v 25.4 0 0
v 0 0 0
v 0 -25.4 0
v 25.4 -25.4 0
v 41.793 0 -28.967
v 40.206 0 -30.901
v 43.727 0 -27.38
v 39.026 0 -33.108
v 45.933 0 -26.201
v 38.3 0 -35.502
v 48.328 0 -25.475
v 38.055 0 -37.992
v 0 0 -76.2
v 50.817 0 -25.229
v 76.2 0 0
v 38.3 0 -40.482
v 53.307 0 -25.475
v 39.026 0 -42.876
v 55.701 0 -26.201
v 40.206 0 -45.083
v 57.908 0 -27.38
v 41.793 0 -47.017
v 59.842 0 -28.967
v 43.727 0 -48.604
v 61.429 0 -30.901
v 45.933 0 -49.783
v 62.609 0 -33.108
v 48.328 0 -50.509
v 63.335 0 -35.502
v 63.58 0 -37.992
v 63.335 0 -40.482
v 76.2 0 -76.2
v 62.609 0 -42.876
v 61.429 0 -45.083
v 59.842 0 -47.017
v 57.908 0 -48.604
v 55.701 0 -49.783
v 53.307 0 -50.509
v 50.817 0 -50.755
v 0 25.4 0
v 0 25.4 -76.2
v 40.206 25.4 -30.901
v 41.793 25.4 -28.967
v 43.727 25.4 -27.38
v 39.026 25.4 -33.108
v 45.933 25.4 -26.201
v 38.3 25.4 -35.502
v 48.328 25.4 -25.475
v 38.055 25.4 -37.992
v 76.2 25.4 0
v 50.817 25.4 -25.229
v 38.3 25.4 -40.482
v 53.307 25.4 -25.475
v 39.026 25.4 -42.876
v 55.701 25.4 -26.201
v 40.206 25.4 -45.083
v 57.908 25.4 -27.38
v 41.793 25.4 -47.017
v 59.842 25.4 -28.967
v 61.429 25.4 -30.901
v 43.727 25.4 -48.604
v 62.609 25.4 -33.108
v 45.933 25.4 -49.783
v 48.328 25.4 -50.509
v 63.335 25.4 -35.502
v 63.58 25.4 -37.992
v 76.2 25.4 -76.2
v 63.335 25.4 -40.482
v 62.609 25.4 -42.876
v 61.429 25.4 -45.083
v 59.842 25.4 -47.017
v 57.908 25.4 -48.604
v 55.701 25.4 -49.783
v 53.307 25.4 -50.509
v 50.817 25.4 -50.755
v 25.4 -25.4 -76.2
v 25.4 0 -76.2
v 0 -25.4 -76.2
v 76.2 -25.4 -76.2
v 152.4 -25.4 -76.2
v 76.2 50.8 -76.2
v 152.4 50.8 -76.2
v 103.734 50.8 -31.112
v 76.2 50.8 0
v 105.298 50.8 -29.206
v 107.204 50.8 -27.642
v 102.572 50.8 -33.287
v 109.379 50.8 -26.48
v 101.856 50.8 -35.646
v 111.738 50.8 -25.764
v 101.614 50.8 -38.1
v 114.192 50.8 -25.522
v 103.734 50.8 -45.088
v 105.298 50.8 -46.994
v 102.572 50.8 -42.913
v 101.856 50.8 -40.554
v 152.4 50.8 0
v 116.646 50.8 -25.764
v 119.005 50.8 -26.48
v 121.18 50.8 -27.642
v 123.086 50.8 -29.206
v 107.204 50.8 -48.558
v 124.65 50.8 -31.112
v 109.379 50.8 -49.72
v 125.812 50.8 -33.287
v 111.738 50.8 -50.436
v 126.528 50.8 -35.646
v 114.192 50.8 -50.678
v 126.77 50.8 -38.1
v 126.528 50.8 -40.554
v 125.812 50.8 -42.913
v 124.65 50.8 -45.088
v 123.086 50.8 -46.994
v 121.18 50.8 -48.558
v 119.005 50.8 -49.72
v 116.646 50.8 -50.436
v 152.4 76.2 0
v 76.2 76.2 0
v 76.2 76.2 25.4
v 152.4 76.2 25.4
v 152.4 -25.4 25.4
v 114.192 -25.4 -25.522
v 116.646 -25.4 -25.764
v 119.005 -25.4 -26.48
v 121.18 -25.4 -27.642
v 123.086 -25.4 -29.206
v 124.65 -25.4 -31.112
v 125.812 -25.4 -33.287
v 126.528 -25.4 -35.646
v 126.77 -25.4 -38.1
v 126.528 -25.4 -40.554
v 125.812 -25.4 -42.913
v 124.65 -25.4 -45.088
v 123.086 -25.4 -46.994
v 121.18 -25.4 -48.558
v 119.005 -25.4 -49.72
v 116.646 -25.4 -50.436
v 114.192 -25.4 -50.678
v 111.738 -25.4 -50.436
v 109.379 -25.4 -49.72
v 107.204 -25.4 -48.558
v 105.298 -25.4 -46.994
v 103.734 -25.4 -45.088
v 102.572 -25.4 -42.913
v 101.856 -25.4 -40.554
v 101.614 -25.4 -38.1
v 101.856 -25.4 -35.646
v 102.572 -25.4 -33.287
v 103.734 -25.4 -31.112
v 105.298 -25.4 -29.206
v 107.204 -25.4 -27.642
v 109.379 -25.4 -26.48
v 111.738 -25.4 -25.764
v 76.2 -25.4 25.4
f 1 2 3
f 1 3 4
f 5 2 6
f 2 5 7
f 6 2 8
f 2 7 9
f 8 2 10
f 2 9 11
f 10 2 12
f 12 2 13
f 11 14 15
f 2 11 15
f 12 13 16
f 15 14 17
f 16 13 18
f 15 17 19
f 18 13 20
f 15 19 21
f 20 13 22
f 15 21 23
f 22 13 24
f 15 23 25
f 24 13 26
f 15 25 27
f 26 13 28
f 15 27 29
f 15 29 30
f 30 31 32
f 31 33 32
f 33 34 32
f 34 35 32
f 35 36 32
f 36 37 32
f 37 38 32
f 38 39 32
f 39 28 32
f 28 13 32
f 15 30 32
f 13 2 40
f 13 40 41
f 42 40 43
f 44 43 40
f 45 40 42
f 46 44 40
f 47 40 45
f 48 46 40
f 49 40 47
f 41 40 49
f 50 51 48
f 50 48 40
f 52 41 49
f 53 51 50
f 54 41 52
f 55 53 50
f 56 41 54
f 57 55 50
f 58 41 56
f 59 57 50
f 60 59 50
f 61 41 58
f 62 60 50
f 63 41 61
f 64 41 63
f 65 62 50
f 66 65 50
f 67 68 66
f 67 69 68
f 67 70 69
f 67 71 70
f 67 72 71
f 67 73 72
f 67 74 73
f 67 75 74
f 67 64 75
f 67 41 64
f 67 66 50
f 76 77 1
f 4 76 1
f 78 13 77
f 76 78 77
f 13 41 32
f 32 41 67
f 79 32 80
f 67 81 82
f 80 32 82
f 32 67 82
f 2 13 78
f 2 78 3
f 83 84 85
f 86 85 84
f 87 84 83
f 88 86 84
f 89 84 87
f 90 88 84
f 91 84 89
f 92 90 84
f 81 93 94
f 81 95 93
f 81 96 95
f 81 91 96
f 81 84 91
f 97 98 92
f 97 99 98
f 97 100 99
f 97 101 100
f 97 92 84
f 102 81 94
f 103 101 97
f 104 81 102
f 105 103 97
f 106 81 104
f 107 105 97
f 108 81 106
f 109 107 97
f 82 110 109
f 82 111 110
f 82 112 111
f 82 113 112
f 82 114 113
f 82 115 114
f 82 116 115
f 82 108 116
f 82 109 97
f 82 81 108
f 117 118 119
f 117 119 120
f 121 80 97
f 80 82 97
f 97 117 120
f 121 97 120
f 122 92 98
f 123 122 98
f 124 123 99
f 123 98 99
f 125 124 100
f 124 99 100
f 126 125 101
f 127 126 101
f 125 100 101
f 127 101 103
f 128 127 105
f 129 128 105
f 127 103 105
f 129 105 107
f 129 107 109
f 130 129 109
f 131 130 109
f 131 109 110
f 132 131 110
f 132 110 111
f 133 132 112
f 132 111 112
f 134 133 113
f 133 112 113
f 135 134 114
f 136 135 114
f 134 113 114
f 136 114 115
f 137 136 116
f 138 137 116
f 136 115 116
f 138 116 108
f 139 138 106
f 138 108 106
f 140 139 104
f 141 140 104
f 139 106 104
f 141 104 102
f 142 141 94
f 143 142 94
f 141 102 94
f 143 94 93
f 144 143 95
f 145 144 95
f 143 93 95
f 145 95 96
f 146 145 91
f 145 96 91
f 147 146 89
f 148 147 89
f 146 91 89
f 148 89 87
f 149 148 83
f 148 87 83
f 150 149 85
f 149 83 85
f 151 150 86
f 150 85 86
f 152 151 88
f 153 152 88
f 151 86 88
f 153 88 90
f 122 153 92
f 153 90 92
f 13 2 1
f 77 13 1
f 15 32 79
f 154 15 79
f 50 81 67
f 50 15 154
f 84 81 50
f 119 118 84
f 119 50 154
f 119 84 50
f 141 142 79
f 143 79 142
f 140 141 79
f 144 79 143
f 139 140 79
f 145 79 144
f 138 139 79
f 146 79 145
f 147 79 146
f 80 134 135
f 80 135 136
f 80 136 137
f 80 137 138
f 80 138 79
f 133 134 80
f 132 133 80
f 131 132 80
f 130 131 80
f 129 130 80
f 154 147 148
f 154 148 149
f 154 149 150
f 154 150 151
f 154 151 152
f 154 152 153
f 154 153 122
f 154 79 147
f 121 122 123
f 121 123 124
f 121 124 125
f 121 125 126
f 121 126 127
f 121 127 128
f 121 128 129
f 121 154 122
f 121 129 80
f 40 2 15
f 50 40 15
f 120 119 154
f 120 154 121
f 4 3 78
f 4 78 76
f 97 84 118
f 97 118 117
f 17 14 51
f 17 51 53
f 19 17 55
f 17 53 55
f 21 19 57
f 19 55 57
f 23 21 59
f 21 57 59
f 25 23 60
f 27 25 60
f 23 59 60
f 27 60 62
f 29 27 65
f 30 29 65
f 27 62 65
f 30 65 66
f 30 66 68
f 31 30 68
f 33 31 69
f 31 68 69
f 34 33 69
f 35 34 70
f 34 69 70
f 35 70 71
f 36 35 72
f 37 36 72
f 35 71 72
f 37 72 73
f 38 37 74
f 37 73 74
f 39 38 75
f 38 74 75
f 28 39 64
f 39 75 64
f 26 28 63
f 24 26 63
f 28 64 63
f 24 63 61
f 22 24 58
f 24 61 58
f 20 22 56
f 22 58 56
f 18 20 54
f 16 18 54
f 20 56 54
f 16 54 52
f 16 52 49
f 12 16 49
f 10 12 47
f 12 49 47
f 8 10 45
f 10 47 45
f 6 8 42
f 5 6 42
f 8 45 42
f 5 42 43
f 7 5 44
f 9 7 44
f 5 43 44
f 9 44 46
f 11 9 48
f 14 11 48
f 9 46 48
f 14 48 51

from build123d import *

# Parameters (mm, degrees)
SKETCH1_W                = 76.2
SKETCH1_H                = 76.2
BOSS_EXTRUDE1_DEPTH      = 25.4
BOSS_EXTRUDE2_DEPTH      = 25.4
BOSS_EXTRUDE2_DEPTH_BACK = 25.4
SKETCH2_W                = 76.2
SKETCH2_H                = 101.6
SKETCH3_W                = 25.4
SKETCH3_H                = 76.2
BOSS_EXTRUDE3_DEPTH      = 25.4
SKETCH4_W                = 76.2
SKETCH4_H                = 25.4
BOSS_EXTRUDE4_DEPTH      = 25.4
SKETCH5_W                = 76.2
SKETCH5_H                = 101.6
BOSS_EXTRUDE5_DEPTH      = 25.4
SKETCH7_R                = 12.577647636
CUT_EXTRUDE1_DEPTH       = 76.2
SKETCH6_R                = 12.762668173
CUT_EXTRUDE2_DEPTH       = 25.4


with BuildPart() as part:
    # Sketch1 → Boss-Extrude1 (new body)
    with BuildSketch(Plane(origin=(0, 0, 0), x_dir=(1, 0, 0), z_dir=(0, 1, 0))):
        with Locations((38.1, 38.1)):
            Rectangle(SKETCH1_W, SKETCH1_H)
    extrude(amount=BOSS_EXTRUDE1_DEPTH)

    # Sketch2 → Boss-Extrude2 (add, two sides: drawn at the far end of the back side and taken through both)
    with BuildSketch(Plane(origin=(0, 25.4, 0), x_dir=(1, 0, 0), z_dir=(0, 1, 0)).offset(-BOSS_EXTRUDE2_DEPTH_BACK)):
        with Locations((114.3, 25.4)):
            Rectangle(SKETCH2_W, SKETCH2_H)
    extrude(amount=BOSS_EXTRUDE2_DEPTH + BOSS_EXTRUDE2_DEPTH_BACK)

    # Sketch4 → Boss-Extrude4 (add)
    with BuildSketch(Plane(origin=(0, 50.8, 0), x_dir=(1, 0, 0), z_dir=(0, 1, 0))):
        with Locations((114.3, -12.7)):
            Rectangle(SKETCH4_W, SKETCH4_H)
    extrude(amount=BOSS_EXTRUDE4_DEPTH)

    # Sketch5 → Boss-Extrude5 (add)
    with BuildSketch(Plane.XZ):
        with Locations((114.3, -25.4)):
            Rectangle(SKETCH5_W, SKETCH5_H)
    extrude(amount=BOSS_EXTRUDE5_DEPTH)

    # Sketch7 → Cut-Extrude1 (cut)
    with BuildSketch(Plane(origin=(0, 50.8, 0), x_dir=(1, 0, 0), z_dir=(0, 1, 0))):
        with Locations((114.191992331, 38.1)):
            Circle(SKETCH7_R)
    extrude(amount=-CUT_EXTRUDE1_DEPTH, mode=Mode.SUBTRACT)

    # Sketch6 → Cut-Extrude2 (cut)
    with BuildSketch(Plane(origin=(0, 25.4, 0), x_dir=(1, 0, 0), z_dir=(0, 1, 0))):
        with Locations((50.817418917, 37.991957485)):
            Circle(SKETCH6_R)
    extrude(amount=-CUT_EXTRUDE2_DEPTH, mode=Mode.SUBTRACT)


with BuildPart() as body_2:
    # Sketch3 → Boss-Extrude3 (new body)
    with BuildSketch(Plane.XZ):
        with Locations((12.7, -38.1)):
            Rectangle(SKETCH3_W, SKETCH3_H)
    extrude(amount=BOSS_EXTRUDE3_DEPTH)


solid = Compound([part.part, body_2.part])
